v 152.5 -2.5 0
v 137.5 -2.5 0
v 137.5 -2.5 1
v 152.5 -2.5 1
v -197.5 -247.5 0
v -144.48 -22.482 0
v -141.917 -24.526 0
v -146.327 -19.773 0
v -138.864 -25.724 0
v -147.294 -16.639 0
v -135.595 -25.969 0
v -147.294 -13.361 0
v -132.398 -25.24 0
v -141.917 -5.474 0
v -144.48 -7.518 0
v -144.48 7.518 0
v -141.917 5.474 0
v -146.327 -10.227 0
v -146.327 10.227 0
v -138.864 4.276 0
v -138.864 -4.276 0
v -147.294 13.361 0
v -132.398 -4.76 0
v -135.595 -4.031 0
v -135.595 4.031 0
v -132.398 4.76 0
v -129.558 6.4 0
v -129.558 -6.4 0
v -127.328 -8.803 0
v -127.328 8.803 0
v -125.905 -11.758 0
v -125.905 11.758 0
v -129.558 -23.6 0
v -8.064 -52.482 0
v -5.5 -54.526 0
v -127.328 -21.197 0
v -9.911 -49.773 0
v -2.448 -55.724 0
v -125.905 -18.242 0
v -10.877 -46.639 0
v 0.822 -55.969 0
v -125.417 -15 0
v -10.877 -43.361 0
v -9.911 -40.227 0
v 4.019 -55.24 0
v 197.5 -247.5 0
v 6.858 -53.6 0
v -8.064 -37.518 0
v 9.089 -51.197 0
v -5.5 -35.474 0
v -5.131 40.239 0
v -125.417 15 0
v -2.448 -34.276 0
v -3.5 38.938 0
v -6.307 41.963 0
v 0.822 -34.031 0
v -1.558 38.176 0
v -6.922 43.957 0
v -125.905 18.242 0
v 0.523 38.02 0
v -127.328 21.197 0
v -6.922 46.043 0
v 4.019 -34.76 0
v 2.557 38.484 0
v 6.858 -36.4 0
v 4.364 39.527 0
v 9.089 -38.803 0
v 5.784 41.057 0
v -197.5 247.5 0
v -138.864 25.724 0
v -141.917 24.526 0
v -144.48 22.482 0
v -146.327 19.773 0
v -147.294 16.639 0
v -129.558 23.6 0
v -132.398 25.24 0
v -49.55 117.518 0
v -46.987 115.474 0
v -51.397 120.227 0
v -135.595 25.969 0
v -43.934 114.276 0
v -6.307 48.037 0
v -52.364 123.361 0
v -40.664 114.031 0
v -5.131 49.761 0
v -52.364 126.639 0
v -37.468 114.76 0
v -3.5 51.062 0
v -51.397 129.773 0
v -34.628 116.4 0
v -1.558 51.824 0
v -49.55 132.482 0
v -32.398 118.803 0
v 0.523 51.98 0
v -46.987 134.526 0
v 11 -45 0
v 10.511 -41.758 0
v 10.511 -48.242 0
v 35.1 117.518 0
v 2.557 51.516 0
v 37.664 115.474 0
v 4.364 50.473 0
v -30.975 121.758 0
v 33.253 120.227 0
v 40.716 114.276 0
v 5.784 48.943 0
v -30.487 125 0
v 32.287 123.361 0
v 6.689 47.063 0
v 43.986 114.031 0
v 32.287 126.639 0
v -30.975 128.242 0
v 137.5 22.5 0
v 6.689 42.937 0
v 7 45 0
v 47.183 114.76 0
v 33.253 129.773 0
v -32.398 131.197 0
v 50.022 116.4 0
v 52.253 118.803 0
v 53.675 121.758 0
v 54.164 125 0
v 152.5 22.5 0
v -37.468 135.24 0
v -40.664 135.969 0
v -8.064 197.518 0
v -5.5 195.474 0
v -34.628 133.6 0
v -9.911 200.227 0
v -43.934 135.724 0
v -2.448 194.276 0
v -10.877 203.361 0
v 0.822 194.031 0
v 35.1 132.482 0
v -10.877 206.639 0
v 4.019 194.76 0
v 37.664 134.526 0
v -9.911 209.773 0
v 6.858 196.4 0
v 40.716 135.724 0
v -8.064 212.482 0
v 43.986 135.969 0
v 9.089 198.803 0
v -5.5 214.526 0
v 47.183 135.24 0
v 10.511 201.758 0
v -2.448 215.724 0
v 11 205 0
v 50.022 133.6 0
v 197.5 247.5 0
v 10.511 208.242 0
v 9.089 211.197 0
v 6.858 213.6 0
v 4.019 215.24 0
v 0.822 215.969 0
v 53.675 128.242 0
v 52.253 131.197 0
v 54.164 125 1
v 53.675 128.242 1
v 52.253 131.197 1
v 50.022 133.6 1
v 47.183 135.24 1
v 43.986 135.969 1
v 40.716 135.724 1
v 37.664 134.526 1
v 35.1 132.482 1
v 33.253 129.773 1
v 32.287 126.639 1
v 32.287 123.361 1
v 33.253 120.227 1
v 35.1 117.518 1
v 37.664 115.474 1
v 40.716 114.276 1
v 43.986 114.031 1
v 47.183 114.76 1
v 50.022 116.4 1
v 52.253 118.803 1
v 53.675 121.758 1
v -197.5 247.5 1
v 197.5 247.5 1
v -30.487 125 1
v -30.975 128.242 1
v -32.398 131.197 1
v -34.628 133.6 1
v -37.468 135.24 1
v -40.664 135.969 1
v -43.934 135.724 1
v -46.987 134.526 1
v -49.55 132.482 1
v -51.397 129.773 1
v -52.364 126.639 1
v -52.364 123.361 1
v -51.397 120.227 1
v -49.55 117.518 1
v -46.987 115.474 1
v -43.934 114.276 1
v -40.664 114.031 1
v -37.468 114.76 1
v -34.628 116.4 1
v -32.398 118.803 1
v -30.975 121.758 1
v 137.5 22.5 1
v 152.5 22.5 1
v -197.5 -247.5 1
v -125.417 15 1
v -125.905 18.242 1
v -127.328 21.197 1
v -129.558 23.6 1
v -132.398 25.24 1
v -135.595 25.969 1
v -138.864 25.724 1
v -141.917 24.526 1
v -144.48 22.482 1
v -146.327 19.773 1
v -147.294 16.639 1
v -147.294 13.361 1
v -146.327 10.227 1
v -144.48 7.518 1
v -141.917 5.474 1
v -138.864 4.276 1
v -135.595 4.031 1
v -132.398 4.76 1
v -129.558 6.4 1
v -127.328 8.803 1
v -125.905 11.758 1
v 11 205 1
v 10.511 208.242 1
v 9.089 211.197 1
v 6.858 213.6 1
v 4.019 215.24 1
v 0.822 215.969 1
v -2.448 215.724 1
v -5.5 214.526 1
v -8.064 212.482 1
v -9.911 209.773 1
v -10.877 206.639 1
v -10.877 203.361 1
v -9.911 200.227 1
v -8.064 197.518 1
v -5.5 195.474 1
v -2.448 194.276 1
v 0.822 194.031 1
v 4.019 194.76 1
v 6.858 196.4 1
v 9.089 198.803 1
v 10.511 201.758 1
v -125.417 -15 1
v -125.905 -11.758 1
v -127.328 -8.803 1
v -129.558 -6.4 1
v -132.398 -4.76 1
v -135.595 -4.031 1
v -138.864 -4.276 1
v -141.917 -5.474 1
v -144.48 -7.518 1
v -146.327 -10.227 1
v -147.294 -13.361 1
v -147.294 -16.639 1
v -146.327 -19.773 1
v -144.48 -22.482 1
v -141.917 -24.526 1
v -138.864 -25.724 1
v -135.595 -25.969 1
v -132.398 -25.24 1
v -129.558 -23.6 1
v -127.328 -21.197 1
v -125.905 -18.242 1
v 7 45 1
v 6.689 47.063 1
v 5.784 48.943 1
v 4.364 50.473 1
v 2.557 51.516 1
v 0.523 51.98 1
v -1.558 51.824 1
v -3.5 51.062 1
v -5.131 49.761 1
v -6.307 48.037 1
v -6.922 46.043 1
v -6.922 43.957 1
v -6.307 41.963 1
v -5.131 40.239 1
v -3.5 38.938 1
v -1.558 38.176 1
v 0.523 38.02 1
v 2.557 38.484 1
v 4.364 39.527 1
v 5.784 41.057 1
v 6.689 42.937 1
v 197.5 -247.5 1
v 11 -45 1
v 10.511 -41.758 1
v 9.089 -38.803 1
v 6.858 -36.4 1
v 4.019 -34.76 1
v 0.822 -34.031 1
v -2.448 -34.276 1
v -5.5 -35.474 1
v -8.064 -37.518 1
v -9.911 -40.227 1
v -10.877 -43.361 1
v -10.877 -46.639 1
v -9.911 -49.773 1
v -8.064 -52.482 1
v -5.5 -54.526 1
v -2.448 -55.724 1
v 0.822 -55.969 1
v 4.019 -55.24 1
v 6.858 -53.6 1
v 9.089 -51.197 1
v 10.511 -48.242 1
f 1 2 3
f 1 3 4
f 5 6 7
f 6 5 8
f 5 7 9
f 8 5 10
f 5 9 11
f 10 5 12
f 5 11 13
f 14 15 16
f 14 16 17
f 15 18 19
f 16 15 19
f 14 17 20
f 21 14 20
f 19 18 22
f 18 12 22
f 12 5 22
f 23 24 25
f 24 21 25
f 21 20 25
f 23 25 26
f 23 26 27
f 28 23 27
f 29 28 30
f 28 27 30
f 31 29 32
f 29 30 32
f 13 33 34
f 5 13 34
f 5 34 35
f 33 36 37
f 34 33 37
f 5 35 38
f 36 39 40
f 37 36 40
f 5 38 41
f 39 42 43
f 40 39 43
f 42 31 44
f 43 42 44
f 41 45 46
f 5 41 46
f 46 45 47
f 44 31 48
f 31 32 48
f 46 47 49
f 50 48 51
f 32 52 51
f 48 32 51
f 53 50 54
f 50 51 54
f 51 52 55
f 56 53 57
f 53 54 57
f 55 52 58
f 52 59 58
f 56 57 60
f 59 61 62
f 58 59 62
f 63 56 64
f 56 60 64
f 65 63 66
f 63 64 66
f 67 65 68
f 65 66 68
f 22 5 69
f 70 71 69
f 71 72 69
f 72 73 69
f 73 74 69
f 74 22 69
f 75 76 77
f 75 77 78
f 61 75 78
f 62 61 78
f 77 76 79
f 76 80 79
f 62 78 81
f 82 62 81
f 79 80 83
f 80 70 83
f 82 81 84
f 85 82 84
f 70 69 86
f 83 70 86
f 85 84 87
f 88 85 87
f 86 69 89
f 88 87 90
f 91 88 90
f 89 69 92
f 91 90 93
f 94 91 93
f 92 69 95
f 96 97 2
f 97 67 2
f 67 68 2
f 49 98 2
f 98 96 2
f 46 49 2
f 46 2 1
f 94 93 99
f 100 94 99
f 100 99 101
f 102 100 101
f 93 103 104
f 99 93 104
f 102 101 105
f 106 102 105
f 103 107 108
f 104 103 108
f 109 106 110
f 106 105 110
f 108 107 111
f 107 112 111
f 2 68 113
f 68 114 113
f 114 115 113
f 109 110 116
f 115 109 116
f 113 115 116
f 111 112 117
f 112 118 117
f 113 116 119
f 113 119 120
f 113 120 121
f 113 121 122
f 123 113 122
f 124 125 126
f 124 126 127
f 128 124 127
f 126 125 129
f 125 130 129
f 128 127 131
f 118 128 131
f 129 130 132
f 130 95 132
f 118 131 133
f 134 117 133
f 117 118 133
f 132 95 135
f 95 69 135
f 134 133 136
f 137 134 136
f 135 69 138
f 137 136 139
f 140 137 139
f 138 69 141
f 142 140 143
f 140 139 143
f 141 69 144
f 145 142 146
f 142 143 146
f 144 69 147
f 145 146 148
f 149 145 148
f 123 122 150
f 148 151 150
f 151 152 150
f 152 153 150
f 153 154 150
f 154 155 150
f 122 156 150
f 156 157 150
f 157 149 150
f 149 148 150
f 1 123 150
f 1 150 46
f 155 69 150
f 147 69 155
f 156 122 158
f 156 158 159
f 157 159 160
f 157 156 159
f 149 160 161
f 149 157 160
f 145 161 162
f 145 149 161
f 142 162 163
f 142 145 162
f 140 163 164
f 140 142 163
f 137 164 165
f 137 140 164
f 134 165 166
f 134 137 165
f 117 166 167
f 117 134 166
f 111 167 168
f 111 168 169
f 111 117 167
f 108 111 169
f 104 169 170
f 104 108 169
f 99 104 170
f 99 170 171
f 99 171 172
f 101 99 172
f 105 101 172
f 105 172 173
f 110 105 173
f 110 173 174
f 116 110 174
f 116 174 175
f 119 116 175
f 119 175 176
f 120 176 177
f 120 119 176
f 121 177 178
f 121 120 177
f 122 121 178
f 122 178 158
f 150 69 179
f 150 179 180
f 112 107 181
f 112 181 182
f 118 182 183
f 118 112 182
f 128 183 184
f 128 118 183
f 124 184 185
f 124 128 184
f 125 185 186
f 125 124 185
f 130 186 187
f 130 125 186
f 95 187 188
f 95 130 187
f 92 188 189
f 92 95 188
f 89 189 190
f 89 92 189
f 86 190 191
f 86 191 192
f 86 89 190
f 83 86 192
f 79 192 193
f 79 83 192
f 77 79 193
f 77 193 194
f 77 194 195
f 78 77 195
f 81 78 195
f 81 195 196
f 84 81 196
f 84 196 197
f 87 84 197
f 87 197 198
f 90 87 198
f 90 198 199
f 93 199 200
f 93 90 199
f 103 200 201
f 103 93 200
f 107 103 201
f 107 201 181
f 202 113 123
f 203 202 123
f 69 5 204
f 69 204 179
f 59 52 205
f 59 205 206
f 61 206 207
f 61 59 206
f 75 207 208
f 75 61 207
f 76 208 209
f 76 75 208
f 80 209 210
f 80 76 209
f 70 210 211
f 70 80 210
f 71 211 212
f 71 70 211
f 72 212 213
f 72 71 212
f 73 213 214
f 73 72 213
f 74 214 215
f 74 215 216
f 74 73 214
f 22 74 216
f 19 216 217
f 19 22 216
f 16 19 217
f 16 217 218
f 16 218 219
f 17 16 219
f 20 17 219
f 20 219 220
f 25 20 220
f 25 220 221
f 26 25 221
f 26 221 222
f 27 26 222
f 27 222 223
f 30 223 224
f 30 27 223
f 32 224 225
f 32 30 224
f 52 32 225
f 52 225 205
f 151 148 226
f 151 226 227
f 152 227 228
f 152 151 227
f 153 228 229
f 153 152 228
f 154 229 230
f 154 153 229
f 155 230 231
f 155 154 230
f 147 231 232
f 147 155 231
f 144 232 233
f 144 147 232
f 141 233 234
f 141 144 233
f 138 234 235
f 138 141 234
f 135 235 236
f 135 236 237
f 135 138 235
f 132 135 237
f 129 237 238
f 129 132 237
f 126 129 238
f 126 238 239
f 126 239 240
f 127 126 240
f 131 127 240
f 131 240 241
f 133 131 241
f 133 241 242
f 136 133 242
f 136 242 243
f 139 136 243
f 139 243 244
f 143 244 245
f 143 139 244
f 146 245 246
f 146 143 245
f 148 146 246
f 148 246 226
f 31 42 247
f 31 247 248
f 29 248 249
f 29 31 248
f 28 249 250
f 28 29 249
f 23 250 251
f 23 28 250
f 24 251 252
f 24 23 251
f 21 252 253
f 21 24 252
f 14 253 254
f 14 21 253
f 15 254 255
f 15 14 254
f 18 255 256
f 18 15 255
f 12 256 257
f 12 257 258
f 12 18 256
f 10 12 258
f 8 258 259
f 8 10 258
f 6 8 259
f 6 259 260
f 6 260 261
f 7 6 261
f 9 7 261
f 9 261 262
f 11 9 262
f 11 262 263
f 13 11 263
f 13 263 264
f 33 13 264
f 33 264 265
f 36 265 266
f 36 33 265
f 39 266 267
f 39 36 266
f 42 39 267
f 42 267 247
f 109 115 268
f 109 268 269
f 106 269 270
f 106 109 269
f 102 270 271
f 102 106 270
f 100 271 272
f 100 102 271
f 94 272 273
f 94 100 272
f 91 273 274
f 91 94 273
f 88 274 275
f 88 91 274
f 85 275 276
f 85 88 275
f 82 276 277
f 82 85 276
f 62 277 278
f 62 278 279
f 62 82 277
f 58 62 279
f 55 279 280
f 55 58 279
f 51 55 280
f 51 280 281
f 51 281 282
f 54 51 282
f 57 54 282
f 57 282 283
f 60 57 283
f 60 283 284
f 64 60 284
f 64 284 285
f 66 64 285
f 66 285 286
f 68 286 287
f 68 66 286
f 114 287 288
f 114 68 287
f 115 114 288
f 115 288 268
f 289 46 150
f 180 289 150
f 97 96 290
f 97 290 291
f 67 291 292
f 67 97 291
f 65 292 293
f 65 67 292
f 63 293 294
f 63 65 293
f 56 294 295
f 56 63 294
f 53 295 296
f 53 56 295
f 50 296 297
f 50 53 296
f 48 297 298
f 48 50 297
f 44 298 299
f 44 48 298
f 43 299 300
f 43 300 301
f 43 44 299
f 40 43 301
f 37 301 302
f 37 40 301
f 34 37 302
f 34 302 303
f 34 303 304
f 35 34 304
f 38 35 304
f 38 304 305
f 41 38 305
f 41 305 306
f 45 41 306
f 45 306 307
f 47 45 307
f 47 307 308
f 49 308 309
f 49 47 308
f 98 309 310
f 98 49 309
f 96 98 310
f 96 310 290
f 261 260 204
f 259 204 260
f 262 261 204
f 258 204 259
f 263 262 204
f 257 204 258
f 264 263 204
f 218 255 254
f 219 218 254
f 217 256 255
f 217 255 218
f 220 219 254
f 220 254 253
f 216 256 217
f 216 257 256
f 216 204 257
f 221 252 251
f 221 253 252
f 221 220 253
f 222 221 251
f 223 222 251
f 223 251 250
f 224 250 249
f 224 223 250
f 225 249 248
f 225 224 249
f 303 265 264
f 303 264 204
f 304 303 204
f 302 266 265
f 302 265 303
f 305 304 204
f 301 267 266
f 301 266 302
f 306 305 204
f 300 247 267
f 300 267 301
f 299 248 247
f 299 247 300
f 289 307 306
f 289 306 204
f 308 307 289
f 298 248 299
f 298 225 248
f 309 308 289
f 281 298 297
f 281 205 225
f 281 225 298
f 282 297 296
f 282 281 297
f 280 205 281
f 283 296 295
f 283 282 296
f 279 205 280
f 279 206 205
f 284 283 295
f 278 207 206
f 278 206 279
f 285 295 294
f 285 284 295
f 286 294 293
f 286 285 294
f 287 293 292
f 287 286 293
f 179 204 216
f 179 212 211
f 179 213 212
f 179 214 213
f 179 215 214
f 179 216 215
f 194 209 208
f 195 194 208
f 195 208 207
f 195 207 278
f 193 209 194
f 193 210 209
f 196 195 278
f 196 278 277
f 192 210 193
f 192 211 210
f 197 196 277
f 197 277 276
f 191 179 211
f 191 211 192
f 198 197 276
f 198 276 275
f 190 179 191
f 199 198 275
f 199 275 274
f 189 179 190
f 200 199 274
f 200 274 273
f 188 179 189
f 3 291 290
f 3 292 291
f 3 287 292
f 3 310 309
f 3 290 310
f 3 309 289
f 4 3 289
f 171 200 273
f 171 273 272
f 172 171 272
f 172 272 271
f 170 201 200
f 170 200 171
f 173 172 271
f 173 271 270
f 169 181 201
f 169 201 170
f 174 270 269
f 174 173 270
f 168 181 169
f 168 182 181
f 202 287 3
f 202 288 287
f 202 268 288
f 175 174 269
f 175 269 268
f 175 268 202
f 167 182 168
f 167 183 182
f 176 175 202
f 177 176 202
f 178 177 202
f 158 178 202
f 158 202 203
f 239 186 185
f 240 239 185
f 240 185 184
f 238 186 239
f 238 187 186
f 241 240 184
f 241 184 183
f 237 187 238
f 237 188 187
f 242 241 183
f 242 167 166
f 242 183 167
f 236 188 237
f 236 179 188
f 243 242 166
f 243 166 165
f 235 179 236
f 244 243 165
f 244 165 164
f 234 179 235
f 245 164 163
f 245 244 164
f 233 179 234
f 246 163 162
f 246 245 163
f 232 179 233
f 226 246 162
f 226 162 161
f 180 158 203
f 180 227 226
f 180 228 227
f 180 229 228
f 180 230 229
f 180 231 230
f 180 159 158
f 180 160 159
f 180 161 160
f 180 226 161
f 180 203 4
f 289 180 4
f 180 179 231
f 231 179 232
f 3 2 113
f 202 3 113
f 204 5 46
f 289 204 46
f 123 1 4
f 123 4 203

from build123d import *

# Parameters (mm, degrees)
F0_W     = 395
F0_H     = 495
F0_R     = 11
F0_R_2   = 7
F0_W_2   = 15
F0_H_2   = 25
F1_DEPTH = 1


with BuildPart() as f1:
    # F0 (on Top) → F1 (new body)
    with BuildSketch(Plane.XY):
        Rectangle(F0_W, F0_H)
        with Locations((-136.41675, -15)):
            Circle(F0_R, mode=Mode.SUBTRACT)
        with Locations((0, -45)):
            Circle(F0_R, mode=Mode.SUBTRACT)
        with Locations((-136.41675, 15)):
            Circle(F0_R, mode=Mode.SUBTRACT)
        with Locations((-41.486505, 125)):
            Circle(F0_R, mode=Mode.SUBTRACT)
        with Locations((0, 45)):
            Circle(F0_R_2, mode=Mode.SUBTRACT)
        with Locations((145, 10)):
            Rectangle(F0_W_2, F0_H_2, mode=Mode.SUBTRACT)
        with Locations((43.16403, 125)):
            Circle(F0_R, mode=Mode.SUBTRACT)
        with Locations((0, 205)):
            Circle(F0_R, mode=Mode.SUBTRACT)
    extrude(amount=F1_DEPTH)


solid = f1.part
